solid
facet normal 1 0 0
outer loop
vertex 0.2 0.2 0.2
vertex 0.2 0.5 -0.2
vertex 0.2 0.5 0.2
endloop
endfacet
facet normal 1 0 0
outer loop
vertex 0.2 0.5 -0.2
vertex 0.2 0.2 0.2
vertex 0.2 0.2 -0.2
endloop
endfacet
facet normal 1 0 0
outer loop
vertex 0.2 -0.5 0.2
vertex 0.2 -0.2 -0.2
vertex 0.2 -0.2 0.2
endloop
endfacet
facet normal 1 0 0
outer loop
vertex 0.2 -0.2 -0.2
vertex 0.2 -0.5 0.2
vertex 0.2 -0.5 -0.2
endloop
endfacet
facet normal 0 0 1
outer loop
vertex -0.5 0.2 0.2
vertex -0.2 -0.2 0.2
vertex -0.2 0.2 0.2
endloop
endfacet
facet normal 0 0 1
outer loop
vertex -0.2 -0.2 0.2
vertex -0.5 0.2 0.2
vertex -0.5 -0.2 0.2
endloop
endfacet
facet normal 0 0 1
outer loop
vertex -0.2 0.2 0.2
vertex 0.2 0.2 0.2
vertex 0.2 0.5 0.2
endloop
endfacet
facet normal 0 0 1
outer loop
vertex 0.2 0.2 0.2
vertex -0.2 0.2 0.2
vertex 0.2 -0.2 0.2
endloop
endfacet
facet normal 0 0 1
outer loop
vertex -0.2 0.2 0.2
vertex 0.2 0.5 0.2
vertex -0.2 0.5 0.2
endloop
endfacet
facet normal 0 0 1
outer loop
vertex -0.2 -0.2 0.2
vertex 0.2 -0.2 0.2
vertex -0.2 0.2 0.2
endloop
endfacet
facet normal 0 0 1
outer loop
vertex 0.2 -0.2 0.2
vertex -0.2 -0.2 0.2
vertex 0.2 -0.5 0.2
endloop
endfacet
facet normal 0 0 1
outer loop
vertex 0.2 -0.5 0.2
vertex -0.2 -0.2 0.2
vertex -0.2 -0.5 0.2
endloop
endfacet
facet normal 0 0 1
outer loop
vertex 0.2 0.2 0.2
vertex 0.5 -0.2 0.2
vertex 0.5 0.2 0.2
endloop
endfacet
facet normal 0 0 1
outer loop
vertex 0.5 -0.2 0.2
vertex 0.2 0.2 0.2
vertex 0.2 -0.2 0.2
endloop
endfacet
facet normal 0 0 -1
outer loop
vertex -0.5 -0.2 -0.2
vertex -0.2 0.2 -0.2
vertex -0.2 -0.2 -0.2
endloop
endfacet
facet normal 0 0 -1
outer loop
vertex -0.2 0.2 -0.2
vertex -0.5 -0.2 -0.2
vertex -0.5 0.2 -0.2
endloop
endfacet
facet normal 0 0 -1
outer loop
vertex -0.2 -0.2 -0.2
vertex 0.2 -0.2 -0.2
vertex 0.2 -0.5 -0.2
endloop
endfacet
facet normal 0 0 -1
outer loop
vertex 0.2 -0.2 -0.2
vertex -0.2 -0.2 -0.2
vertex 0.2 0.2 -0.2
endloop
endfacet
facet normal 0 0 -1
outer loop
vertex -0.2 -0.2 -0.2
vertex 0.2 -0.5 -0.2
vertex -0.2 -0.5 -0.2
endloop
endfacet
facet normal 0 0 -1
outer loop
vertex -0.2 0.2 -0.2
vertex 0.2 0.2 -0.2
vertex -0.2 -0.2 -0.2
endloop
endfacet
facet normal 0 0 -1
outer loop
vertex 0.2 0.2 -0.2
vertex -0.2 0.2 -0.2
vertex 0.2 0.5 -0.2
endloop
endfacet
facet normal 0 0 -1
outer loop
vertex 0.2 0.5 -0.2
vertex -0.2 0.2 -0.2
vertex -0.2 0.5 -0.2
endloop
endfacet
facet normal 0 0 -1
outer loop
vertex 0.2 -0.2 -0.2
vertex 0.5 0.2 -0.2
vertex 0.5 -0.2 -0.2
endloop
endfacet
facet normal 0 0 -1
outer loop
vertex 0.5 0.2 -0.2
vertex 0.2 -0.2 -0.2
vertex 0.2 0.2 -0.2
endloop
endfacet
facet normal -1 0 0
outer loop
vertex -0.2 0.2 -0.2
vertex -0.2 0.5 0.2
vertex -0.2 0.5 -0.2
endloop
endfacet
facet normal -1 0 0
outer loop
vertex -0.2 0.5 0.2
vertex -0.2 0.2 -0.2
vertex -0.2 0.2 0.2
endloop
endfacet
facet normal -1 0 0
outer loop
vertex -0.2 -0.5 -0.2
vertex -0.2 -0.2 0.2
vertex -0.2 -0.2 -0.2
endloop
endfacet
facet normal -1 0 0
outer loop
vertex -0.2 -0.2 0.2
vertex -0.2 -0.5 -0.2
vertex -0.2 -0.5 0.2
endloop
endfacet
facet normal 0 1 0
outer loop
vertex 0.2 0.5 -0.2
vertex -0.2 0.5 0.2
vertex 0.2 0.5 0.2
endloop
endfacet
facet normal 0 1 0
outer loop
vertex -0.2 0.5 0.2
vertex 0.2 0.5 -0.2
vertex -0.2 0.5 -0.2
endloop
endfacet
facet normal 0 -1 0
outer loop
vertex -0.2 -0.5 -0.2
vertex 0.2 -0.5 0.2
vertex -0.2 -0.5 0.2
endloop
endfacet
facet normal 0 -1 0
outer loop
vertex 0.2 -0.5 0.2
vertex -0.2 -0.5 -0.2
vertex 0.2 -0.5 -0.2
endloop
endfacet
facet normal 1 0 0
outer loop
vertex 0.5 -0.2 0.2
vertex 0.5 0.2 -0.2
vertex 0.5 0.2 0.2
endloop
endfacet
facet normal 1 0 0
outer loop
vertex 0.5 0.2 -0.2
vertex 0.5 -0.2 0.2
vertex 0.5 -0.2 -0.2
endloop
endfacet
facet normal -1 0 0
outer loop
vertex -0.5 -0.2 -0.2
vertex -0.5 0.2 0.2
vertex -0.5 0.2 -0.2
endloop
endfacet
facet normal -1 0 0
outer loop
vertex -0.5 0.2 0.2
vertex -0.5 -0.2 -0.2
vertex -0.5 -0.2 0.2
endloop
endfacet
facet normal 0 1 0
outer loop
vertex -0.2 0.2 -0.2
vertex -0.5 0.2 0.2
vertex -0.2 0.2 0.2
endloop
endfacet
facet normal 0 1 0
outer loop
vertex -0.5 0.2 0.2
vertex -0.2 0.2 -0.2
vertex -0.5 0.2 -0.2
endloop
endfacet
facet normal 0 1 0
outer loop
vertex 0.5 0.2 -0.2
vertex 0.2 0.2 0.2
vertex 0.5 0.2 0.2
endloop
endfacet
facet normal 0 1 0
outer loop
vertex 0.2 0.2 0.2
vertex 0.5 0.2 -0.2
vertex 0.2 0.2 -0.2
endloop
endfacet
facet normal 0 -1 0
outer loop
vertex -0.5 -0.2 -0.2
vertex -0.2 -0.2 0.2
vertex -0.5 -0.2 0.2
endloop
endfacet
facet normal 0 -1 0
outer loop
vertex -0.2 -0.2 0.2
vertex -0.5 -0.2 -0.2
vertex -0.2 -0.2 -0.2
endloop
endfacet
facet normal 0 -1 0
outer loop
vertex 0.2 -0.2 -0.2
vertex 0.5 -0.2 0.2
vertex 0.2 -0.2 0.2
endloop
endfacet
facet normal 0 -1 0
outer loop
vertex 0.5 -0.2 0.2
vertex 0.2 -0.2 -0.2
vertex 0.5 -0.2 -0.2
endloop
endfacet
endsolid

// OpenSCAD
// Native subset boolean fixture.
union() {
  cube([1.0, 0.4, 0.4], center = true);
  difference() {
    cube([0.4, 1.0, 0.4], center = true);
    translate([0.0, 0.0, 0.05])
      cube([0.2, 0.2, 0.6], center = true);
  }
}
